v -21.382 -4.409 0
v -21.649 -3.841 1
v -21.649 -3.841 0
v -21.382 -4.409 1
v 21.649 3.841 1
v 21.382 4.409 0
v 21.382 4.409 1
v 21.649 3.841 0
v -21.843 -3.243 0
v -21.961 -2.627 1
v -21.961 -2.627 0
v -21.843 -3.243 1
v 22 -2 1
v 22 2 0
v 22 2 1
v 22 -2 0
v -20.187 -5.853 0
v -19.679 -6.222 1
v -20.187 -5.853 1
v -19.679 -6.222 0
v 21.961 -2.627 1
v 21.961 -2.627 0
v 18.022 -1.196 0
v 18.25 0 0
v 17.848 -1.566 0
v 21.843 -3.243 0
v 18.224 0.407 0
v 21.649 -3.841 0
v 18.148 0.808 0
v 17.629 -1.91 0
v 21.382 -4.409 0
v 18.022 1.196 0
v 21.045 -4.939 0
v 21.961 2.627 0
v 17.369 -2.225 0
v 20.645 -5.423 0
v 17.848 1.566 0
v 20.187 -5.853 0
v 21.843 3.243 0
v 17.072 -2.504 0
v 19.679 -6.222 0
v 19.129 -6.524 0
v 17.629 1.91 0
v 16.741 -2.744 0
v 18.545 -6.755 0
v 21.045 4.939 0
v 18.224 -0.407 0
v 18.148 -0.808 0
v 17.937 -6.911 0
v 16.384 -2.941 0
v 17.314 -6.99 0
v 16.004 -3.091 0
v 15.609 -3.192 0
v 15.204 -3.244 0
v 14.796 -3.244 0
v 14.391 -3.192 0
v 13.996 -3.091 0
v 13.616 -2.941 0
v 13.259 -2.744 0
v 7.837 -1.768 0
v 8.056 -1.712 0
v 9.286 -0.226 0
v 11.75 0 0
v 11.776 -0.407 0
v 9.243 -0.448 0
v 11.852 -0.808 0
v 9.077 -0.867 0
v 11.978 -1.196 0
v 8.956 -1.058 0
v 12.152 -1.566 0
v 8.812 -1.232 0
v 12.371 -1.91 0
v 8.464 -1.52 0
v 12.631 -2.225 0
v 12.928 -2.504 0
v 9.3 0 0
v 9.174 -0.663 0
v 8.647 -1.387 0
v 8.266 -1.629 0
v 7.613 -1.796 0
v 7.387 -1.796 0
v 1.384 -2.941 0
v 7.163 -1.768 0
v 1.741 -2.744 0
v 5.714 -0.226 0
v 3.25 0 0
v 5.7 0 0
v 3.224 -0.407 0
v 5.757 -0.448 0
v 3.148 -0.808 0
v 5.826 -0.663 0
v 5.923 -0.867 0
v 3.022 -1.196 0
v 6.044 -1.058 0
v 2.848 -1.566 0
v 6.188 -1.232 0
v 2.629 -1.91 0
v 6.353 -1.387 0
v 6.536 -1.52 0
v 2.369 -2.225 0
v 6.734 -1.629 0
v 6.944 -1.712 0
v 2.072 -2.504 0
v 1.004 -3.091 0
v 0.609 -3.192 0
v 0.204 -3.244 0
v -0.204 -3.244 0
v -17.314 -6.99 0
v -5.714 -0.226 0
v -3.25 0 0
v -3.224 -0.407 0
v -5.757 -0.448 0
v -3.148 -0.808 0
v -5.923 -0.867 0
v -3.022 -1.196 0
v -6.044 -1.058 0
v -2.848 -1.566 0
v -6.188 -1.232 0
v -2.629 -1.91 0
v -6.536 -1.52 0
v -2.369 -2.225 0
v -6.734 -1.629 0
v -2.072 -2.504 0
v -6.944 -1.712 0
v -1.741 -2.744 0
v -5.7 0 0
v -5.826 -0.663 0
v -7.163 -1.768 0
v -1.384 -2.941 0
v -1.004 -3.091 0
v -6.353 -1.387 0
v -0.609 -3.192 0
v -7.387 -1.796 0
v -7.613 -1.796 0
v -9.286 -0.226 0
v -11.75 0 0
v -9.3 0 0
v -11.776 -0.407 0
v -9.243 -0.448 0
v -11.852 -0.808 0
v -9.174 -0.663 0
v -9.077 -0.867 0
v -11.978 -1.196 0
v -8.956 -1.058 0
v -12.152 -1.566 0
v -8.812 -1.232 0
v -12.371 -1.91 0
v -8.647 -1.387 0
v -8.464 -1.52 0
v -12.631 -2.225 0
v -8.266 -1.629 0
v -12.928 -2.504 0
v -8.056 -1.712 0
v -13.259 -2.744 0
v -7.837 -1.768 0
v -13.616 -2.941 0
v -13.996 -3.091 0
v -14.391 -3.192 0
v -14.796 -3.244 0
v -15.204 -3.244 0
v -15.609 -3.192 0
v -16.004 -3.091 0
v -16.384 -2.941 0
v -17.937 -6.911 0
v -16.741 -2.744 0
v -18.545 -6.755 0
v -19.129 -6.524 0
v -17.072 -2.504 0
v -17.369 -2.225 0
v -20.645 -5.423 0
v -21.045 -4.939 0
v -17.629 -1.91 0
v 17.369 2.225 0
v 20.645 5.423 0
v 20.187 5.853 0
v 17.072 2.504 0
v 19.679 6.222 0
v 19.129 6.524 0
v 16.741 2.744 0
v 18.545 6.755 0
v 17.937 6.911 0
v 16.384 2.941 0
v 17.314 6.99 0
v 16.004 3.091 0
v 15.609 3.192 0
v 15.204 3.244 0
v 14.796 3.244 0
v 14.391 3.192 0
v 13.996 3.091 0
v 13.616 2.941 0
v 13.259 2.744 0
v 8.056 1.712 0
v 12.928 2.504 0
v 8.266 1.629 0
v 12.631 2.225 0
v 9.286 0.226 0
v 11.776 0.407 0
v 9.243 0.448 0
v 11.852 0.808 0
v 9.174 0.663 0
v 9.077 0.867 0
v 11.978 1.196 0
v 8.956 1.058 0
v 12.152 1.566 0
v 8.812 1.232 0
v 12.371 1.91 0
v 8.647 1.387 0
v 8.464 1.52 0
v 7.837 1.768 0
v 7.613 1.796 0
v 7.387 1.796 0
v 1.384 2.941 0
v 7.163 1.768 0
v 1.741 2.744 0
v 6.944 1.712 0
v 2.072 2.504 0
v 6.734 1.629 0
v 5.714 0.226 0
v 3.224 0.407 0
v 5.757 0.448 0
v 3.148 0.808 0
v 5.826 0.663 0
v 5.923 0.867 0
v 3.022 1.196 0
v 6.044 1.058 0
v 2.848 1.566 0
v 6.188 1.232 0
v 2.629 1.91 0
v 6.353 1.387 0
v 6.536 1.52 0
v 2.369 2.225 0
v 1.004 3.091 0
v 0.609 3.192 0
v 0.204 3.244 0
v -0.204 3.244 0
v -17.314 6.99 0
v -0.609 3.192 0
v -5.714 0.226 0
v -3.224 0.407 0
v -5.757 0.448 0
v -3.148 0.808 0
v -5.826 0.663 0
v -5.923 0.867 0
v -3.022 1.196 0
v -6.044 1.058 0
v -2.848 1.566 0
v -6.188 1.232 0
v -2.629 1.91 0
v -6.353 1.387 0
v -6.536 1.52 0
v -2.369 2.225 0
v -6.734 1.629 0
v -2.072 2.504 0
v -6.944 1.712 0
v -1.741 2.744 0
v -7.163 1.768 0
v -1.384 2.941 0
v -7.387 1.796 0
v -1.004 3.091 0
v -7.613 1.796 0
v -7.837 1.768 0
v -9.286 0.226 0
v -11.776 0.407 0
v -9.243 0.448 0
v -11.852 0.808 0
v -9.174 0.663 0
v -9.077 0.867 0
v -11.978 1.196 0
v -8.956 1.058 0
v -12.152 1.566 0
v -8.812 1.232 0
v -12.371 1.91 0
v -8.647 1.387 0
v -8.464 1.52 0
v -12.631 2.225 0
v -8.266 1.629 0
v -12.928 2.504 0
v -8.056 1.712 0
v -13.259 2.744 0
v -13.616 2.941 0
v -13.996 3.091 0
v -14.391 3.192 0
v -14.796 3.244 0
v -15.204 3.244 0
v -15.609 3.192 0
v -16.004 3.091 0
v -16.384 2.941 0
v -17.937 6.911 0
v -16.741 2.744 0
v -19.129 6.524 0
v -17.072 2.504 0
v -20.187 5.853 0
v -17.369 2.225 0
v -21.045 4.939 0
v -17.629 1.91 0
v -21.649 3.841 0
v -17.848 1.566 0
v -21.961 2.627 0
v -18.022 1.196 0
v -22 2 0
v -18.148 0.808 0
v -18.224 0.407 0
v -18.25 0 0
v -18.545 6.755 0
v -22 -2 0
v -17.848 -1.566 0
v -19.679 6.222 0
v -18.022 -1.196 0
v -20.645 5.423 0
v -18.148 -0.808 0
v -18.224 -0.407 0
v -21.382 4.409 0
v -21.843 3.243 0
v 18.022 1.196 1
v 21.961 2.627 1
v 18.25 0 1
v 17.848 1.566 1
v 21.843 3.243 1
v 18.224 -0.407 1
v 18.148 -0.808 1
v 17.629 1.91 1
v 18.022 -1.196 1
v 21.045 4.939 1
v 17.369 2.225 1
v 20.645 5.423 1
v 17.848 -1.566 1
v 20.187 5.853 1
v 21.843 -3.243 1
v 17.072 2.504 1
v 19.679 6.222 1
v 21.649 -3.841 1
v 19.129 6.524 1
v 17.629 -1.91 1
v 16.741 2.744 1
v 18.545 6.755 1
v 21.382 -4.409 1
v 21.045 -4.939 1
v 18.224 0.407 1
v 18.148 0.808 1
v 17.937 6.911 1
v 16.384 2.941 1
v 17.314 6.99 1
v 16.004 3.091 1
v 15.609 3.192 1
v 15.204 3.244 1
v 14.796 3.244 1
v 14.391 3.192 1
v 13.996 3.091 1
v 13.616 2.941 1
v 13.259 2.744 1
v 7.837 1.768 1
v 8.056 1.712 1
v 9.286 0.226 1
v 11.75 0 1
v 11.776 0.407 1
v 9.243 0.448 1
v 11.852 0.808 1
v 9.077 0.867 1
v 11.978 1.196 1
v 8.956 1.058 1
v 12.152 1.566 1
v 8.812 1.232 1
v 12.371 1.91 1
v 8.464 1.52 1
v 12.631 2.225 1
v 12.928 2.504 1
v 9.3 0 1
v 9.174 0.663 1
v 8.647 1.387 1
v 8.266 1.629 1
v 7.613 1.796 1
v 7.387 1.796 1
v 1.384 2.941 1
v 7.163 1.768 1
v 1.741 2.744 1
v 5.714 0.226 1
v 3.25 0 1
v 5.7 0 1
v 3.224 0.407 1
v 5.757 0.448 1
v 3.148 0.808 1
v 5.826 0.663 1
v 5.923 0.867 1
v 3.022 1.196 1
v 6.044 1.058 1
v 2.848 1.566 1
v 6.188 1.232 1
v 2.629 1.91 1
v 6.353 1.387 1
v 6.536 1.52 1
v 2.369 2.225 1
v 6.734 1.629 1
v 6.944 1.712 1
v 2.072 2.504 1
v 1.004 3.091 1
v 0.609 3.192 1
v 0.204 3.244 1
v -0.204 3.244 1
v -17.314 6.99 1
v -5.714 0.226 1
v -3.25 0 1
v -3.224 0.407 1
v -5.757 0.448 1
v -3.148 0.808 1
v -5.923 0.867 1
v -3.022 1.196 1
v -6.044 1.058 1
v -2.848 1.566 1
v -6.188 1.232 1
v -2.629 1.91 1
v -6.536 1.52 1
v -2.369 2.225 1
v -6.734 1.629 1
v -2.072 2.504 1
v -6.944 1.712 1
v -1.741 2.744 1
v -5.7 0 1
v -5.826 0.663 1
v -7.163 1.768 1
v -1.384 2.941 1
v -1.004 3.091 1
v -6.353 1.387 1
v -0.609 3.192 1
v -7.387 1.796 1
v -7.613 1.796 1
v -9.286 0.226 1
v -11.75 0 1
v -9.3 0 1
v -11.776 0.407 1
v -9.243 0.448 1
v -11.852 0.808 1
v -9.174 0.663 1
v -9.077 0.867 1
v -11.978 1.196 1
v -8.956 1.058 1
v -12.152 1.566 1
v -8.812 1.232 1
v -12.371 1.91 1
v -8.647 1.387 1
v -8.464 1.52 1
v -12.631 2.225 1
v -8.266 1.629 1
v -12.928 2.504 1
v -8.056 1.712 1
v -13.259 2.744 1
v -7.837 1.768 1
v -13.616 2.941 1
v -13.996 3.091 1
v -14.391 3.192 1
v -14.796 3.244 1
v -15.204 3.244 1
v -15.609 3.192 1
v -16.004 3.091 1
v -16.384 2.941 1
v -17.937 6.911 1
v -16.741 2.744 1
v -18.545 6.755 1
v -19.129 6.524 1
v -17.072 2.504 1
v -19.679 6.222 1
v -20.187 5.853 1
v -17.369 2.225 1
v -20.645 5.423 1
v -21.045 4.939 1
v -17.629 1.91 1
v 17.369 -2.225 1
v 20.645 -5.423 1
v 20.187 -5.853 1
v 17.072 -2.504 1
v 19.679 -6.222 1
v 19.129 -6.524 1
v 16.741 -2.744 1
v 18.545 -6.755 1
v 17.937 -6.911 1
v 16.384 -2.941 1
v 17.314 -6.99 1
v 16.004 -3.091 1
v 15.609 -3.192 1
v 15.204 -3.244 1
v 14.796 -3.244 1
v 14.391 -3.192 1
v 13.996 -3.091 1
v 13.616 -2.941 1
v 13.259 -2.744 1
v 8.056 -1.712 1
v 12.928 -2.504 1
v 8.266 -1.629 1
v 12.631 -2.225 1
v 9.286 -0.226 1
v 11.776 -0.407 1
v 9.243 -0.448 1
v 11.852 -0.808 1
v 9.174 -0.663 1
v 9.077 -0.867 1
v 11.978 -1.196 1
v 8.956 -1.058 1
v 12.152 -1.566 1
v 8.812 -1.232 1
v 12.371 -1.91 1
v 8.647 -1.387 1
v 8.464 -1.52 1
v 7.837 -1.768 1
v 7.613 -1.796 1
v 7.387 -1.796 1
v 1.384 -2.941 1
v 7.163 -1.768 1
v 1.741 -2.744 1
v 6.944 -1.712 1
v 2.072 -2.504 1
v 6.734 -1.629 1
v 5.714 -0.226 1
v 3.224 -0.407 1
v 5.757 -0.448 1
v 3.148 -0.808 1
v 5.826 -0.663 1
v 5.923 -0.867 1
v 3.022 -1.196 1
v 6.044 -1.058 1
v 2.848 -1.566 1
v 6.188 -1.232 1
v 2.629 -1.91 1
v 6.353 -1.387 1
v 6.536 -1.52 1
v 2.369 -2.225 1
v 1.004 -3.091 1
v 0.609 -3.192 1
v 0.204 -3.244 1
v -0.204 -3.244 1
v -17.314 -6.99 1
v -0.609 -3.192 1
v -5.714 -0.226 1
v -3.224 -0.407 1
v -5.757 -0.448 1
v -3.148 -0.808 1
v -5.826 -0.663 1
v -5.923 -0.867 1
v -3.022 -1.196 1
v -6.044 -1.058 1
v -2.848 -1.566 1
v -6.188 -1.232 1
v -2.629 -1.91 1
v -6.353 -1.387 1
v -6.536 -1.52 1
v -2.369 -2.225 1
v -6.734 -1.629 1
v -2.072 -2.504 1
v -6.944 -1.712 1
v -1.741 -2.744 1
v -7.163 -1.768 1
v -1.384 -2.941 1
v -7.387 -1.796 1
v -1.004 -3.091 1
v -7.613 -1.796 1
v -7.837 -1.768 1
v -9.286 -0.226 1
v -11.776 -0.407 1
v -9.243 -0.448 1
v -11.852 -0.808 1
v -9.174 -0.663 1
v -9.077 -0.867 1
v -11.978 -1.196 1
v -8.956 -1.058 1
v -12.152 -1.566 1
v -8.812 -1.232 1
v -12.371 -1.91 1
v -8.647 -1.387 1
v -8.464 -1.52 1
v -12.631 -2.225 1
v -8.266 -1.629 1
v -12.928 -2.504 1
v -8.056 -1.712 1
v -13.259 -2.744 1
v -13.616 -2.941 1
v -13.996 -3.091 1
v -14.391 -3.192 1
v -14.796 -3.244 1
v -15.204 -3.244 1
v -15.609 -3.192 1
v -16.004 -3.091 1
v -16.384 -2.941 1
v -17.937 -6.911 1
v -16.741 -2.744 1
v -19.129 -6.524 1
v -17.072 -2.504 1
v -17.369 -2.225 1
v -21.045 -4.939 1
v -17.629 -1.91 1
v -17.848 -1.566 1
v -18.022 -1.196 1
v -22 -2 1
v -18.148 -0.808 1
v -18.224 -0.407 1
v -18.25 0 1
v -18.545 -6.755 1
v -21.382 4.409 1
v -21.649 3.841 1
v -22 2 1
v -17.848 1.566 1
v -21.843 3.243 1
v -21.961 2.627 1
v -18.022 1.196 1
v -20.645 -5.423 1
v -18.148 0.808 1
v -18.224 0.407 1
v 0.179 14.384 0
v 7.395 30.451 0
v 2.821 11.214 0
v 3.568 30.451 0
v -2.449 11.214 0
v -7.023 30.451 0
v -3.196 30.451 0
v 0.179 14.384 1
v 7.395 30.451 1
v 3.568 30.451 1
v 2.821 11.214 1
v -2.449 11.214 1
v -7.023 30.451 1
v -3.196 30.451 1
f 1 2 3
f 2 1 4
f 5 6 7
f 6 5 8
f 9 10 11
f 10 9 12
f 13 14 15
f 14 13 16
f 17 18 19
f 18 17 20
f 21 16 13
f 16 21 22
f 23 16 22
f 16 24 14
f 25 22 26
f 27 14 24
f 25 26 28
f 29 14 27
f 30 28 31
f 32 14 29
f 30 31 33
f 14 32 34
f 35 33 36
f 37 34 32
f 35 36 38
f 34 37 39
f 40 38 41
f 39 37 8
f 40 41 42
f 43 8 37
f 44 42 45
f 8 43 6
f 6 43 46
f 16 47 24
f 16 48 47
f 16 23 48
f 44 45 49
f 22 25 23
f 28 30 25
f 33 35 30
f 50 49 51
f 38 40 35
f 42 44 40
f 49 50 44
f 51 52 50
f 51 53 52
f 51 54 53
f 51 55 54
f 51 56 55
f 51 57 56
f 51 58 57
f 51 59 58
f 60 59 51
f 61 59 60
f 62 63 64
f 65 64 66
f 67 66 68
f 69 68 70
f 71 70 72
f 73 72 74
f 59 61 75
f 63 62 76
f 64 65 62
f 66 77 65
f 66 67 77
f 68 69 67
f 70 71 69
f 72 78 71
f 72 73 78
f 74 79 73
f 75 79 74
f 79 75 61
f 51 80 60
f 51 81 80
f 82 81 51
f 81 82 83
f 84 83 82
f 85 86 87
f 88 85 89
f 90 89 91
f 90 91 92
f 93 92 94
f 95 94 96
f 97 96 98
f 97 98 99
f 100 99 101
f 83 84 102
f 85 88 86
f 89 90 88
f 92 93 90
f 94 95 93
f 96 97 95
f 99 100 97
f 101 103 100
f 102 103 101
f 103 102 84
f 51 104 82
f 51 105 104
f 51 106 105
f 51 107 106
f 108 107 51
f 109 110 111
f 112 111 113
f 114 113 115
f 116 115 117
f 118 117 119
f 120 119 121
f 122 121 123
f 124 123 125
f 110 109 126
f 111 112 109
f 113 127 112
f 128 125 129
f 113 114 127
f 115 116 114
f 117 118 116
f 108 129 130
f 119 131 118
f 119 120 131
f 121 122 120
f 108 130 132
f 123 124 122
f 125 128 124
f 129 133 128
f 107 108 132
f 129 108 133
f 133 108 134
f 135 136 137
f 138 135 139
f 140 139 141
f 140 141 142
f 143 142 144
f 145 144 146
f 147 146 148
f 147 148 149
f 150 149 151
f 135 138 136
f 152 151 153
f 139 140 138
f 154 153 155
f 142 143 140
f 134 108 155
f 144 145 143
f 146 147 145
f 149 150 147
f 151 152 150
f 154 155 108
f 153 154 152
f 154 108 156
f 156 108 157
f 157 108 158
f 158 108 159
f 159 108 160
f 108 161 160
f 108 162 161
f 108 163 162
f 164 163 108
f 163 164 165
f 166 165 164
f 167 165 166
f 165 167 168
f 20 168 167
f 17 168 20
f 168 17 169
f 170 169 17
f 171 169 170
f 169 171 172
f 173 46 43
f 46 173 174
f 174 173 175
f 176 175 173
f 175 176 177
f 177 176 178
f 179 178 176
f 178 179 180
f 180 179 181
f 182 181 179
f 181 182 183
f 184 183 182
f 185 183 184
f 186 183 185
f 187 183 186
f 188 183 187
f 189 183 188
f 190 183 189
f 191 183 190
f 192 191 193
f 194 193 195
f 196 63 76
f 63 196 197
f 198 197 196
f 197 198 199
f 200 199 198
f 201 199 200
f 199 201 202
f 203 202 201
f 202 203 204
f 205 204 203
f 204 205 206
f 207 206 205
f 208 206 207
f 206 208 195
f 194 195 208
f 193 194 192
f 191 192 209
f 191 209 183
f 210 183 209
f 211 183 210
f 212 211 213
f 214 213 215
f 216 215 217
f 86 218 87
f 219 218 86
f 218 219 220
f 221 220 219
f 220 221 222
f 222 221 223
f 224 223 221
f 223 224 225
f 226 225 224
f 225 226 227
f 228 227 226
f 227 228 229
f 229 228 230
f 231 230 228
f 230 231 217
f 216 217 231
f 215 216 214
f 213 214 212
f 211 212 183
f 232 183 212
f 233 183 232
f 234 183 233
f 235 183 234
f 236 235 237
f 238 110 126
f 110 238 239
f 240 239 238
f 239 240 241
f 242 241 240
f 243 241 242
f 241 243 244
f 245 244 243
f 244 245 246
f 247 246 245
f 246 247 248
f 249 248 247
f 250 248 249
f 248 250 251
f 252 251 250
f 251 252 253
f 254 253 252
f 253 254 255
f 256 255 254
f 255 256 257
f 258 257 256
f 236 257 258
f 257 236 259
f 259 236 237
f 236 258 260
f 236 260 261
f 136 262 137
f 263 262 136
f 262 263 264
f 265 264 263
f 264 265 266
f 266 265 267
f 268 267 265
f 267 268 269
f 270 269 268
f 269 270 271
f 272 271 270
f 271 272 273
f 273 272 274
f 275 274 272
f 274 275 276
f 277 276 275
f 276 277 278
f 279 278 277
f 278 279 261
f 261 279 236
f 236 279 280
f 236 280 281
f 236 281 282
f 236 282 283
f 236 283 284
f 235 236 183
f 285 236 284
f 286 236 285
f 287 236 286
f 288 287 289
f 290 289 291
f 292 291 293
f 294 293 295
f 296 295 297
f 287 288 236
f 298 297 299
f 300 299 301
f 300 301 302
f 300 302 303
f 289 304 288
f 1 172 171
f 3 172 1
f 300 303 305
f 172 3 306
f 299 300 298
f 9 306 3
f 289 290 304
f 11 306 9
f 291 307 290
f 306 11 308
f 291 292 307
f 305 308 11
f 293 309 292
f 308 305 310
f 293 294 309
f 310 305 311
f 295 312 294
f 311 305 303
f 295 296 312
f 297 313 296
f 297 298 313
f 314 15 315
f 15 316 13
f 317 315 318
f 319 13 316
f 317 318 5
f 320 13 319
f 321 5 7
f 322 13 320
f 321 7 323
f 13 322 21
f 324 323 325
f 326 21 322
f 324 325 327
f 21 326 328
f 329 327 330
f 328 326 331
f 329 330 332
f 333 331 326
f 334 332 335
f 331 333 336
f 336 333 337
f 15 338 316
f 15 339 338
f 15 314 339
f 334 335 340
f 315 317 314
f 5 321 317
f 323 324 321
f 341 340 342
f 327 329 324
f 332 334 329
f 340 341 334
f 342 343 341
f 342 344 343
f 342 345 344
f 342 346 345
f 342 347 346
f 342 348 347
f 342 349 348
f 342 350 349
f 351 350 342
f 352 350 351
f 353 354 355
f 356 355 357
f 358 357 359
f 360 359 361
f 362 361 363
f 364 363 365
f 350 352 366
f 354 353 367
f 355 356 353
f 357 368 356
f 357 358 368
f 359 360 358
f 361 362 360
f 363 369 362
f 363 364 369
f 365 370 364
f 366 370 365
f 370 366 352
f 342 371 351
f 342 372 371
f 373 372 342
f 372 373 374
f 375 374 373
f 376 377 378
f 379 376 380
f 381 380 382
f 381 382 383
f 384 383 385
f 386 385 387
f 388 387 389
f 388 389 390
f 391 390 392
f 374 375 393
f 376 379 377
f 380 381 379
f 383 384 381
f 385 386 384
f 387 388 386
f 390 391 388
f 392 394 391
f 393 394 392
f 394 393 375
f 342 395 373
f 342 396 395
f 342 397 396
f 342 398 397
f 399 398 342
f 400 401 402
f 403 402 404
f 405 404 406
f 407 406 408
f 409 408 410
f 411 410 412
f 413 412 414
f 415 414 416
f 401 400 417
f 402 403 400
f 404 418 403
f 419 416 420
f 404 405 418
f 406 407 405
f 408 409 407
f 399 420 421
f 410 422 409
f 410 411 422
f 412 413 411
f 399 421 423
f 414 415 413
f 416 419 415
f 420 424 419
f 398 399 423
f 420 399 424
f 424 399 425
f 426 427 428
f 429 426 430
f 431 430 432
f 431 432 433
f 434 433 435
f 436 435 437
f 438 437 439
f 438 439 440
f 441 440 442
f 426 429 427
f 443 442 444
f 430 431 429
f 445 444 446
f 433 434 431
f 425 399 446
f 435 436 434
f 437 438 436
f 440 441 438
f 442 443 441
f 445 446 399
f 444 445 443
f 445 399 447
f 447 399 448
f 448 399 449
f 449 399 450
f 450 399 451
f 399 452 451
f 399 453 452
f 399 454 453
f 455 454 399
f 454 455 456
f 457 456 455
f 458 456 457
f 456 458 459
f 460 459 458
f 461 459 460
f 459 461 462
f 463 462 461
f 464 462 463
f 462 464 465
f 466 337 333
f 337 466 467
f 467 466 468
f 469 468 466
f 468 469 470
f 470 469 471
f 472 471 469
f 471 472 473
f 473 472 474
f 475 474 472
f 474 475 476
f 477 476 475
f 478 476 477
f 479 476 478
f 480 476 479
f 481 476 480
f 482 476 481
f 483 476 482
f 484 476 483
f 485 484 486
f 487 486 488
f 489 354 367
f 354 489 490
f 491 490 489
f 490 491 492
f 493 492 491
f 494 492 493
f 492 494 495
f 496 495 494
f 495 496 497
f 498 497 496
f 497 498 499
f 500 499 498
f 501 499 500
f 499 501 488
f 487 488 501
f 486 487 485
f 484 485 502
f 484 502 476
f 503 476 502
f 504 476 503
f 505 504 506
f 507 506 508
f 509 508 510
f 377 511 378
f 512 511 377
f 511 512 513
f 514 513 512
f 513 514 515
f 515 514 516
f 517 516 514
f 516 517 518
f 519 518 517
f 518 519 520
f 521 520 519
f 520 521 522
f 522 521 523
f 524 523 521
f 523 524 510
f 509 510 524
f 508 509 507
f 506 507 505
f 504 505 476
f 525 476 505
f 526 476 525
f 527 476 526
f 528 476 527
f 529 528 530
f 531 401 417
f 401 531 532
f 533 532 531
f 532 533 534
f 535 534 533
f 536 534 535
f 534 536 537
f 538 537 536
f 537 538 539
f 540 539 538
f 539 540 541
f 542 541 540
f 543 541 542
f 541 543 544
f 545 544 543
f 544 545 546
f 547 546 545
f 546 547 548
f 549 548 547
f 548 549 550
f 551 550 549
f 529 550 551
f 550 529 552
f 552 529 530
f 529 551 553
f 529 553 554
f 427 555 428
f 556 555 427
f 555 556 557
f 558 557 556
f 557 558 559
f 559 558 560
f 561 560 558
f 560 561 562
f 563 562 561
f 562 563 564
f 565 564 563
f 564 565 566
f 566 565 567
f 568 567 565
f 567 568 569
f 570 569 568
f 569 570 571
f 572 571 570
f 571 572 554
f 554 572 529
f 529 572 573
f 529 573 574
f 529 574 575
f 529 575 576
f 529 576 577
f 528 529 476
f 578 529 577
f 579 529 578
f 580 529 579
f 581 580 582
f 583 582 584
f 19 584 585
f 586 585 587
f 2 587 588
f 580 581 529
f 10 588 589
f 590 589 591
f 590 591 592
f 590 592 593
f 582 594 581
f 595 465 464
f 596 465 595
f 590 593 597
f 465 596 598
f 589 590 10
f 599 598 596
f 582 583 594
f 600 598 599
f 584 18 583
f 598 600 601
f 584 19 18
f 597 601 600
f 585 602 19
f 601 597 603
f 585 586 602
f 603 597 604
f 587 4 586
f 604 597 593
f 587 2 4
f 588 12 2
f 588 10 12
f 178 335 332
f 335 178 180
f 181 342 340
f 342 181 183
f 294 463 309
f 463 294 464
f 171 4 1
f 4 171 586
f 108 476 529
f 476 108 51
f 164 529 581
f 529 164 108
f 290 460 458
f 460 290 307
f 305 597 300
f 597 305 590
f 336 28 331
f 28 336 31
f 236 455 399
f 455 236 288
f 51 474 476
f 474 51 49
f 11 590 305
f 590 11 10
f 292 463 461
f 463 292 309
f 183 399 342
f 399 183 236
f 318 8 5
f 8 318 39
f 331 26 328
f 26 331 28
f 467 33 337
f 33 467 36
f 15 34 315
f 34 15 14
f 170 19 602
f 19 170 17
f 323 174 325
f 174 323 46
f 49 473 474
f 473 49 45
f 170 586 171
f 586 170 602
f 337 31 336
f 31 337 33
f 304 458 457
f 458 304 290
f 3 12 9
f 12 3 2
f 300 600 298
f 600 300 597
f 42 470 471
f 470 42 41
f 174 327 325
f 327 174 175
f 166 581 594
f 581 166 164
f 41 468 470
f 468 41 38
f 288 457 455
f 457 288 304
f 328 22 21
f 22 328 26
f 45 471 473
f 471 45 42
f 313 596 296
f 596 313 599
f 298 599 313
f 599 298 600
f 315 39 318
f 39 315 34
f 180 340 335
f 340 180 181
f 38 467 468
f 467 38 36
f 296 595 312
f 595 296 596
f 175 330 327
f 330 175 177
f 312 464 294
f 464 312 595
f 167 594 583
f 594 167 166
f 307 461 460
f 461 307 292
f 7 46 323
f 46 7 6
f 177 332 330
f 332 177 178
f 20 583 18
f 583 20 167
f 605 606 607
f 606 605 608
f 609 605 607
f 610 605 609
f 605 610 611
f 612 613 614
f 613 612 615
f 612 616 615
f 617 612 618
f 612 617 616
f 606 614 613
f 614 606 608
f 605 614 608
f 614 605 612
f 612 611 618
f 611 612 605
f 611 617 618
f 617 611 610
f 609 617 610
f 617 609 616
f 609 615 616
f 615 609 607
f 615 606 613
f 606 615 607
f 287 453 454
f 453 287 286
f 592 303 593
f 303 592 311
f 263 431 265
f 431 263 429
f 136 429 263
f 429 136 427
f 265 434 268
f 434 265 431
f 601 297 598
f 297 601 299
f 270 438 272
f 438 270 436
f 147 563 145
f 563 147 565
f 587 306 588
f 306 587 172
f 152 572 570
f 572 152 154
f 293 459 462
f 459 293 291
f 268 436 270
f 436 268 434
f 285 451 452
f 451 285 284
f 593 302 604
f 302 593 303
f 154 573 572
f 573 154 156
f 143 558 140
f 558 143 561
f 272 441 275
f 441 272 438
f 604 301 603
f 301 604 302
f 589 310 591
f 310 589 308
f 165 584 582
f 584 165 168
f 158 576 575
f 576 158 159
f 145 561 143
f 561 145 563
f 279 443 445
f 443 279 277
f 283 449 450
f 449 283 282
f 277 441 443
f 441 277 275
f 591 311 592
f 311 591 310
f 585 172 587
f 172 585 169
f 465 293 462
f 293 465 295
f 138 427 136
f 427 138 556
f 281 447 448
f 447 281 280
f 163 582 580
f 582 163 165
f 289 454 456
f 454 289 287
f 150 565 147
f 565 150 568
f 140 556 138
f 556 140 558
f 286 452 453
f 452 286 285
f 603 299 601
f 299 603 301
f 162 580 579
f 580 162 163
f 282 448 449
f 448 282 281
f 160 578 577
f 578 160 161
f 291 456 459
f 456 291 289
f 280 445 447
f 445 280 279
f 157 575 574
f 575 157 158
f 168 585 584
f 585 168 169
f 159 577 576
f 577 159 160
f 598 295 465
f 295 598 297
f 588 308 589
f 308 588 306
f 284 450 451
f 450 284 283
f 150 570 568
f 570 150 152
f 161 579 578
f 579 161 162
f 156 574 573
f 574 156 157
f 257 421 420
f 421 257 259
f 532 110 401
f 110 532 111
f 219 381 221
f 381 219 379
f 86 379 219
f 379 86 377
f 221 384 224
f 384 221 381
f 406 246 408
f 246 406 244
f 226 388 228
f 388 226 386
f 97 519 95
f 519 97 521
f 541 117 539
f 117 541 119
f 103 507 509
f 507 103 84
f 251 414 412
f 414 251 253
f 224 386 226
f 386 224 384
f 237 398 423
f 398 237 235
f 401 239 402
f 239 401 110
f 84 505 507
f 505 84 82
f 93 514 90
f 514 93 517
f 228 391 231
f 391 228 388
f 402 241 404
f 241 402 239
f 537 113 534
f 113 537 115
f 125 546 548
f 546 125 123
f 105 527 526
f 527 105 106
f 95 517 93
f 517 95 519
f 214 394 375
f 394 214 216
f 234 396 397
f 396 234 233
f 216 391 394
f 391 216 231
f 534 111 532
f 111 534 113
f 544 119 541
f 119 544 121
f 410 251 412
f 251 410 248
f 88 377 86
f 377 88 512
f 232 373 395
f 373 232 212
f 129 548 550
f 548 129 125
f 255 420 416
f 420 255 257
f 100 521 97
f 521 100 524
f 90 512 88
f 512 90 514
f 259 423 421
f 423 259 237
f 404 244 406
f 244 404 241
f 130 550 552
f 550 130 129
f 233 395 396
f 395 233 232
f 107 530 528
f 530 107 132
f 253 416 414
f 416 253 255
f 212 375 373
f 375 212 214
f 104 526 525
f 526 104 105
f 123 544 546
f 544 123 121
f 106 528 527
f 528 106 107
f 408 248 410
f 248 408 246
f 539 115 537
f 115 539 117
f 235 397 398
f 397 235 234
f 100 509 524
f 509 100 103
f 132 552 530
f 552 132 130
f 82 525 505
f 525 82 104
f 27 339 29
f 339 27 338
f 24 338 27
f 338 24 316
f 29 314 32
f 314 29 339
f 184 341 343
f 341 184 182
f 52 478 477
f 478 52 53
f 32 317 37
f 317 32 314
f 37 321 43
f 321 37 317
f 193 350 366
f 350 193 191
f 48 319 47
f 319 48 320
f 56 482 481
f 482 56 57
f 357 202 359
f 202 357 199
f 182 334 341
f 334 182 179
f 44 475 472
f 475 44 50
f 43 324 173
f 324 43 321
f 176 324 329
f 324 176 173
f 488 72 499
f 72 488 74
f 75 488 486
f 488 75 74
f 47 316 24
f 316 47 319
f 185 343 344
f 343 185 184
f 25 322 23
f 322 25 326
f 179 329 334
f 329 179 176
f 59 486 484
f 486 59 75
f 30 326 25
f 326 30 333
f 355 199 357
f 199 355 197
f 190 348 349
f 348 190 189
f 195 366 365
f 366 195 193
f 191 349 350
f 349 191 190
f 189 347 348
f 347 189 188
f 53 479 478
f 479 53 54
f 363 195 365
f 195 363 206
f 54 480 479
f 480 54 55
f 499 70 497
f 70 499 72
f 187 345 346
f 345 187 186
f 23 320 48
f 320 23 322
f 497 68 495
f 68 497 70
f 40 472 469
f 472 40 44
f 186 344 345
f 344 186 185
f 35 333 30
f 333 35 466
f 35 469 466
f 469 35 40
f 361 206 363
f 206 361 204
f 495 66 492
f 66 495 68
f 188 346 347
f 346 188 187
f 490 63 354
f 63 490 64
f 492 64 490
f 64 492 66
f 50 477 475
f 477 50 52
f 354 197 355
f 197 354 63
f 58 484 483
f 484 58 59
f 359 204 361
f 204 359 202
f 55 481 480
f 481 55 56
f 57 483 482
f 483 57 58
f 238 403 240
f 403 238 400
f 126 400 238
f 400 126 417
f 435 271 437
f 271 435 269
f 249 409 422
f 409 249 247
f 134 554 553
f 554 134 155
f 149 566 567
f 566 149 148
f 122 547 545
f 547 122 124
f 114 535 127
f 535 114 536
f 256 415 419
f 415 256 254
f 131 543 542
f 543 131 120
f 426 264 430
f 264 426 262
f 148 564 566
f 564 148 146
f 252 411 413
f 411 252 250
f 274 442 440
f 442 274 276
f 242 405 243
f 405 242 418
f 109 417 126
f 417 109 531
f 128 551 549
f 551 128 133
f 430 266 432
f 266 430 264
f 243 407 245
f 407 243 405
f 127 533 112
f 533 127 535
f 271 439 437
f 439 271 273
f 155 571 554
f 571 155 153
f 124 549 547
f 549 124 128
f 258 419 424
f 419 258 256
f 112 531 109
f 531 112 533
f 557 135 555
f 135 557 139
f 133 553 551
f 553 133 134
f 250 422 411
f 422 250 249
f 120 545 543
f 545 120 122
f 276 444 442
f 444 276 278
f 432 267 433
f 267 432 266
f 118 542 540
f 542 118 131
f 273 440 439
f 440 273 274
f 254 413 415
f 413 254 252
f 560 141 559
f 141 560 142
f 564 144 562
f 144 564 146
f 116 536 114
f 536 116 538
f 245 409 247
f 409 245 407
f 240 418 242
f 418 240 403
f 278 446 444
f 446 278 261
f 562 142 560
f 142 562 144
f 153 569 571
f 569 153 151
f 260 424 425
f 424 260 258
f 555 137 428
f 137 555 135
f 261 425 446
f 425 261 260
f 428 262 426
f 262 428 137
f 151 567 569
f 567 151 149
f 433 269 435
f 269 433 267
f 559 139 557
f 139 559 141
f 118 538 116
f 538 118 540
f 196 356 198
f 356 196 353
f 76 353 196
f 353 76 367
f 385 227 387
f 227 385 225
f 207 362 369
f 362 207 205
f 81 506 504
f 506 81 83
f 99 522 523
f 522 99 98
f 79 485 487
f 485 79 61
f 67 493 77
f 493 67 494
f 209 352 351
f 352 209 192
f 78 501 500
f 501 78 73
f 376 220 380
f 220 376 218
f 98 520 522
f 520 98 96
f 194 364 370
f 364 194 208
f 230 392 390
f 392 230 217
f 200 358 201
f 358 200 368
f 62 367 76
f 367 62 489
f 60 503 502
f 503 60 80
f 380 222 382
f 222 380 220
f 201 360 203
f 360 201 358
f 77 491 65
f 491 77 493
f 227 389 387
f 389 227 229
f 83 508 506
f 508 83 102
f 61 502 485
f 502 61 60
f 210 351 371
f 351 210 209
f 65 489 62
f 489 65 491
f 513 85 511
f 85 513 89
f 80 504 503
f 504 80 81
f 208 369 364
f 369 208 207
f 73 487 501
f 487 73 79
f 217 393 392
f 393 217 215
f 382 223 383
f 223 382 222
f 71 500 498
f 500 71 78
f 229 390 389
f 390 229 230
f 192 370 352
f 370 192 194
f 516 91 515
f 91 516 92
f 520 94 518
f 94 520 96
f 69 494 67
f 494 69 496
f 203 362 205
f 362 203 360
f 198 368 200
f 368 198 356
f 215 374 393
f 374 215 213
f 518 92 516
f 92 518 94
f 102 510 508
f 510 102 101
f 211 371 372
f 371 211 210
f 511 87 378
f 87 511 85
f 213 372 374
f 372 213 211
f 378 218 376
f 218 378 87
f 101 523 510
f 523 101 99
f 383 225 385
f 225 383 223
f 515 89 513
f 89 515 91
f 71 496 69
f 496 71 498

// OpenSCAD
$fn = 50;


difference() {
	union() {
		hull() {
			translate(v = [-17.0000000000, 2.0000000000, 0]) {
				cylinder(h = 1, r = 5);
			}
			translate(v = [17.0000000000, 2.0000000000, 0]) {
				cylinder(h = 1, r = 5);
			}
			translate(v = [-17.0000000000, -2.0000000000, 0]) {
				cylinder(h = 1, r = 5);
			}
			translate(v = [17.0000000000, -2.0000000000, 0]) {
				cylinder(h = 1, r = 5);
			}
		}
		translate(v = [0, 30.0000000000, 0]) {
			linear_extrude(height = 1) {
				text(font = "DejaVu Sans Mono:style=Bold", halign = "center", size = 19.0000000000, text = "V", valign = "top");
			}
		}
	}
	union() {
		translate(v = [-15.0000000000, 0.0000000000, 0]) {
			translate(v = [0, 0, -100]) {
				cylinder(h = 200, r = 3.2500000000);
			}
		}
		translate(v = [0, 0, -100]) {
			cylinder(h = 200, r = 3.2500000000);
		}
		translate(v = [15.0000000000, 0.0000000000, 0]) {
			translate(v = [0, 0, -100]) {
				cylinder(h = 200, r = 3.2500000000);
			}
		}
		translate(v = [-15.0000000000, 0.0000000000, 0]) {
			translate(v = [0, 0, -100]) {
				cylinder(h = 200, r = 1.8000000000);
			}
		}
		translate(v = [-7.5000000000, 0.0000000000, 0]) {
			translate(v = [0, 0, -100]) {
				cylinder(h = 200, r = 1.8000000000);
			}
		}
		translate(v = [0, 0, -100]) {
			cylinder(h = 200, r = 1.8000000000);
		}
		translate(v = [7.5000000000, 0.0000000000, 0]) {
			translate(v = [0, 0, -100]) {
				cylinder(h = 200, r = 1.8000000000);
			}
		}
		translate(v = [15.0000000000, 0.0000000000, 0]) {
			translate(v = [0, 0, -100]) {
				cylinder(h = 200, r = 1.8000000000);
			}
		}
	}
}
